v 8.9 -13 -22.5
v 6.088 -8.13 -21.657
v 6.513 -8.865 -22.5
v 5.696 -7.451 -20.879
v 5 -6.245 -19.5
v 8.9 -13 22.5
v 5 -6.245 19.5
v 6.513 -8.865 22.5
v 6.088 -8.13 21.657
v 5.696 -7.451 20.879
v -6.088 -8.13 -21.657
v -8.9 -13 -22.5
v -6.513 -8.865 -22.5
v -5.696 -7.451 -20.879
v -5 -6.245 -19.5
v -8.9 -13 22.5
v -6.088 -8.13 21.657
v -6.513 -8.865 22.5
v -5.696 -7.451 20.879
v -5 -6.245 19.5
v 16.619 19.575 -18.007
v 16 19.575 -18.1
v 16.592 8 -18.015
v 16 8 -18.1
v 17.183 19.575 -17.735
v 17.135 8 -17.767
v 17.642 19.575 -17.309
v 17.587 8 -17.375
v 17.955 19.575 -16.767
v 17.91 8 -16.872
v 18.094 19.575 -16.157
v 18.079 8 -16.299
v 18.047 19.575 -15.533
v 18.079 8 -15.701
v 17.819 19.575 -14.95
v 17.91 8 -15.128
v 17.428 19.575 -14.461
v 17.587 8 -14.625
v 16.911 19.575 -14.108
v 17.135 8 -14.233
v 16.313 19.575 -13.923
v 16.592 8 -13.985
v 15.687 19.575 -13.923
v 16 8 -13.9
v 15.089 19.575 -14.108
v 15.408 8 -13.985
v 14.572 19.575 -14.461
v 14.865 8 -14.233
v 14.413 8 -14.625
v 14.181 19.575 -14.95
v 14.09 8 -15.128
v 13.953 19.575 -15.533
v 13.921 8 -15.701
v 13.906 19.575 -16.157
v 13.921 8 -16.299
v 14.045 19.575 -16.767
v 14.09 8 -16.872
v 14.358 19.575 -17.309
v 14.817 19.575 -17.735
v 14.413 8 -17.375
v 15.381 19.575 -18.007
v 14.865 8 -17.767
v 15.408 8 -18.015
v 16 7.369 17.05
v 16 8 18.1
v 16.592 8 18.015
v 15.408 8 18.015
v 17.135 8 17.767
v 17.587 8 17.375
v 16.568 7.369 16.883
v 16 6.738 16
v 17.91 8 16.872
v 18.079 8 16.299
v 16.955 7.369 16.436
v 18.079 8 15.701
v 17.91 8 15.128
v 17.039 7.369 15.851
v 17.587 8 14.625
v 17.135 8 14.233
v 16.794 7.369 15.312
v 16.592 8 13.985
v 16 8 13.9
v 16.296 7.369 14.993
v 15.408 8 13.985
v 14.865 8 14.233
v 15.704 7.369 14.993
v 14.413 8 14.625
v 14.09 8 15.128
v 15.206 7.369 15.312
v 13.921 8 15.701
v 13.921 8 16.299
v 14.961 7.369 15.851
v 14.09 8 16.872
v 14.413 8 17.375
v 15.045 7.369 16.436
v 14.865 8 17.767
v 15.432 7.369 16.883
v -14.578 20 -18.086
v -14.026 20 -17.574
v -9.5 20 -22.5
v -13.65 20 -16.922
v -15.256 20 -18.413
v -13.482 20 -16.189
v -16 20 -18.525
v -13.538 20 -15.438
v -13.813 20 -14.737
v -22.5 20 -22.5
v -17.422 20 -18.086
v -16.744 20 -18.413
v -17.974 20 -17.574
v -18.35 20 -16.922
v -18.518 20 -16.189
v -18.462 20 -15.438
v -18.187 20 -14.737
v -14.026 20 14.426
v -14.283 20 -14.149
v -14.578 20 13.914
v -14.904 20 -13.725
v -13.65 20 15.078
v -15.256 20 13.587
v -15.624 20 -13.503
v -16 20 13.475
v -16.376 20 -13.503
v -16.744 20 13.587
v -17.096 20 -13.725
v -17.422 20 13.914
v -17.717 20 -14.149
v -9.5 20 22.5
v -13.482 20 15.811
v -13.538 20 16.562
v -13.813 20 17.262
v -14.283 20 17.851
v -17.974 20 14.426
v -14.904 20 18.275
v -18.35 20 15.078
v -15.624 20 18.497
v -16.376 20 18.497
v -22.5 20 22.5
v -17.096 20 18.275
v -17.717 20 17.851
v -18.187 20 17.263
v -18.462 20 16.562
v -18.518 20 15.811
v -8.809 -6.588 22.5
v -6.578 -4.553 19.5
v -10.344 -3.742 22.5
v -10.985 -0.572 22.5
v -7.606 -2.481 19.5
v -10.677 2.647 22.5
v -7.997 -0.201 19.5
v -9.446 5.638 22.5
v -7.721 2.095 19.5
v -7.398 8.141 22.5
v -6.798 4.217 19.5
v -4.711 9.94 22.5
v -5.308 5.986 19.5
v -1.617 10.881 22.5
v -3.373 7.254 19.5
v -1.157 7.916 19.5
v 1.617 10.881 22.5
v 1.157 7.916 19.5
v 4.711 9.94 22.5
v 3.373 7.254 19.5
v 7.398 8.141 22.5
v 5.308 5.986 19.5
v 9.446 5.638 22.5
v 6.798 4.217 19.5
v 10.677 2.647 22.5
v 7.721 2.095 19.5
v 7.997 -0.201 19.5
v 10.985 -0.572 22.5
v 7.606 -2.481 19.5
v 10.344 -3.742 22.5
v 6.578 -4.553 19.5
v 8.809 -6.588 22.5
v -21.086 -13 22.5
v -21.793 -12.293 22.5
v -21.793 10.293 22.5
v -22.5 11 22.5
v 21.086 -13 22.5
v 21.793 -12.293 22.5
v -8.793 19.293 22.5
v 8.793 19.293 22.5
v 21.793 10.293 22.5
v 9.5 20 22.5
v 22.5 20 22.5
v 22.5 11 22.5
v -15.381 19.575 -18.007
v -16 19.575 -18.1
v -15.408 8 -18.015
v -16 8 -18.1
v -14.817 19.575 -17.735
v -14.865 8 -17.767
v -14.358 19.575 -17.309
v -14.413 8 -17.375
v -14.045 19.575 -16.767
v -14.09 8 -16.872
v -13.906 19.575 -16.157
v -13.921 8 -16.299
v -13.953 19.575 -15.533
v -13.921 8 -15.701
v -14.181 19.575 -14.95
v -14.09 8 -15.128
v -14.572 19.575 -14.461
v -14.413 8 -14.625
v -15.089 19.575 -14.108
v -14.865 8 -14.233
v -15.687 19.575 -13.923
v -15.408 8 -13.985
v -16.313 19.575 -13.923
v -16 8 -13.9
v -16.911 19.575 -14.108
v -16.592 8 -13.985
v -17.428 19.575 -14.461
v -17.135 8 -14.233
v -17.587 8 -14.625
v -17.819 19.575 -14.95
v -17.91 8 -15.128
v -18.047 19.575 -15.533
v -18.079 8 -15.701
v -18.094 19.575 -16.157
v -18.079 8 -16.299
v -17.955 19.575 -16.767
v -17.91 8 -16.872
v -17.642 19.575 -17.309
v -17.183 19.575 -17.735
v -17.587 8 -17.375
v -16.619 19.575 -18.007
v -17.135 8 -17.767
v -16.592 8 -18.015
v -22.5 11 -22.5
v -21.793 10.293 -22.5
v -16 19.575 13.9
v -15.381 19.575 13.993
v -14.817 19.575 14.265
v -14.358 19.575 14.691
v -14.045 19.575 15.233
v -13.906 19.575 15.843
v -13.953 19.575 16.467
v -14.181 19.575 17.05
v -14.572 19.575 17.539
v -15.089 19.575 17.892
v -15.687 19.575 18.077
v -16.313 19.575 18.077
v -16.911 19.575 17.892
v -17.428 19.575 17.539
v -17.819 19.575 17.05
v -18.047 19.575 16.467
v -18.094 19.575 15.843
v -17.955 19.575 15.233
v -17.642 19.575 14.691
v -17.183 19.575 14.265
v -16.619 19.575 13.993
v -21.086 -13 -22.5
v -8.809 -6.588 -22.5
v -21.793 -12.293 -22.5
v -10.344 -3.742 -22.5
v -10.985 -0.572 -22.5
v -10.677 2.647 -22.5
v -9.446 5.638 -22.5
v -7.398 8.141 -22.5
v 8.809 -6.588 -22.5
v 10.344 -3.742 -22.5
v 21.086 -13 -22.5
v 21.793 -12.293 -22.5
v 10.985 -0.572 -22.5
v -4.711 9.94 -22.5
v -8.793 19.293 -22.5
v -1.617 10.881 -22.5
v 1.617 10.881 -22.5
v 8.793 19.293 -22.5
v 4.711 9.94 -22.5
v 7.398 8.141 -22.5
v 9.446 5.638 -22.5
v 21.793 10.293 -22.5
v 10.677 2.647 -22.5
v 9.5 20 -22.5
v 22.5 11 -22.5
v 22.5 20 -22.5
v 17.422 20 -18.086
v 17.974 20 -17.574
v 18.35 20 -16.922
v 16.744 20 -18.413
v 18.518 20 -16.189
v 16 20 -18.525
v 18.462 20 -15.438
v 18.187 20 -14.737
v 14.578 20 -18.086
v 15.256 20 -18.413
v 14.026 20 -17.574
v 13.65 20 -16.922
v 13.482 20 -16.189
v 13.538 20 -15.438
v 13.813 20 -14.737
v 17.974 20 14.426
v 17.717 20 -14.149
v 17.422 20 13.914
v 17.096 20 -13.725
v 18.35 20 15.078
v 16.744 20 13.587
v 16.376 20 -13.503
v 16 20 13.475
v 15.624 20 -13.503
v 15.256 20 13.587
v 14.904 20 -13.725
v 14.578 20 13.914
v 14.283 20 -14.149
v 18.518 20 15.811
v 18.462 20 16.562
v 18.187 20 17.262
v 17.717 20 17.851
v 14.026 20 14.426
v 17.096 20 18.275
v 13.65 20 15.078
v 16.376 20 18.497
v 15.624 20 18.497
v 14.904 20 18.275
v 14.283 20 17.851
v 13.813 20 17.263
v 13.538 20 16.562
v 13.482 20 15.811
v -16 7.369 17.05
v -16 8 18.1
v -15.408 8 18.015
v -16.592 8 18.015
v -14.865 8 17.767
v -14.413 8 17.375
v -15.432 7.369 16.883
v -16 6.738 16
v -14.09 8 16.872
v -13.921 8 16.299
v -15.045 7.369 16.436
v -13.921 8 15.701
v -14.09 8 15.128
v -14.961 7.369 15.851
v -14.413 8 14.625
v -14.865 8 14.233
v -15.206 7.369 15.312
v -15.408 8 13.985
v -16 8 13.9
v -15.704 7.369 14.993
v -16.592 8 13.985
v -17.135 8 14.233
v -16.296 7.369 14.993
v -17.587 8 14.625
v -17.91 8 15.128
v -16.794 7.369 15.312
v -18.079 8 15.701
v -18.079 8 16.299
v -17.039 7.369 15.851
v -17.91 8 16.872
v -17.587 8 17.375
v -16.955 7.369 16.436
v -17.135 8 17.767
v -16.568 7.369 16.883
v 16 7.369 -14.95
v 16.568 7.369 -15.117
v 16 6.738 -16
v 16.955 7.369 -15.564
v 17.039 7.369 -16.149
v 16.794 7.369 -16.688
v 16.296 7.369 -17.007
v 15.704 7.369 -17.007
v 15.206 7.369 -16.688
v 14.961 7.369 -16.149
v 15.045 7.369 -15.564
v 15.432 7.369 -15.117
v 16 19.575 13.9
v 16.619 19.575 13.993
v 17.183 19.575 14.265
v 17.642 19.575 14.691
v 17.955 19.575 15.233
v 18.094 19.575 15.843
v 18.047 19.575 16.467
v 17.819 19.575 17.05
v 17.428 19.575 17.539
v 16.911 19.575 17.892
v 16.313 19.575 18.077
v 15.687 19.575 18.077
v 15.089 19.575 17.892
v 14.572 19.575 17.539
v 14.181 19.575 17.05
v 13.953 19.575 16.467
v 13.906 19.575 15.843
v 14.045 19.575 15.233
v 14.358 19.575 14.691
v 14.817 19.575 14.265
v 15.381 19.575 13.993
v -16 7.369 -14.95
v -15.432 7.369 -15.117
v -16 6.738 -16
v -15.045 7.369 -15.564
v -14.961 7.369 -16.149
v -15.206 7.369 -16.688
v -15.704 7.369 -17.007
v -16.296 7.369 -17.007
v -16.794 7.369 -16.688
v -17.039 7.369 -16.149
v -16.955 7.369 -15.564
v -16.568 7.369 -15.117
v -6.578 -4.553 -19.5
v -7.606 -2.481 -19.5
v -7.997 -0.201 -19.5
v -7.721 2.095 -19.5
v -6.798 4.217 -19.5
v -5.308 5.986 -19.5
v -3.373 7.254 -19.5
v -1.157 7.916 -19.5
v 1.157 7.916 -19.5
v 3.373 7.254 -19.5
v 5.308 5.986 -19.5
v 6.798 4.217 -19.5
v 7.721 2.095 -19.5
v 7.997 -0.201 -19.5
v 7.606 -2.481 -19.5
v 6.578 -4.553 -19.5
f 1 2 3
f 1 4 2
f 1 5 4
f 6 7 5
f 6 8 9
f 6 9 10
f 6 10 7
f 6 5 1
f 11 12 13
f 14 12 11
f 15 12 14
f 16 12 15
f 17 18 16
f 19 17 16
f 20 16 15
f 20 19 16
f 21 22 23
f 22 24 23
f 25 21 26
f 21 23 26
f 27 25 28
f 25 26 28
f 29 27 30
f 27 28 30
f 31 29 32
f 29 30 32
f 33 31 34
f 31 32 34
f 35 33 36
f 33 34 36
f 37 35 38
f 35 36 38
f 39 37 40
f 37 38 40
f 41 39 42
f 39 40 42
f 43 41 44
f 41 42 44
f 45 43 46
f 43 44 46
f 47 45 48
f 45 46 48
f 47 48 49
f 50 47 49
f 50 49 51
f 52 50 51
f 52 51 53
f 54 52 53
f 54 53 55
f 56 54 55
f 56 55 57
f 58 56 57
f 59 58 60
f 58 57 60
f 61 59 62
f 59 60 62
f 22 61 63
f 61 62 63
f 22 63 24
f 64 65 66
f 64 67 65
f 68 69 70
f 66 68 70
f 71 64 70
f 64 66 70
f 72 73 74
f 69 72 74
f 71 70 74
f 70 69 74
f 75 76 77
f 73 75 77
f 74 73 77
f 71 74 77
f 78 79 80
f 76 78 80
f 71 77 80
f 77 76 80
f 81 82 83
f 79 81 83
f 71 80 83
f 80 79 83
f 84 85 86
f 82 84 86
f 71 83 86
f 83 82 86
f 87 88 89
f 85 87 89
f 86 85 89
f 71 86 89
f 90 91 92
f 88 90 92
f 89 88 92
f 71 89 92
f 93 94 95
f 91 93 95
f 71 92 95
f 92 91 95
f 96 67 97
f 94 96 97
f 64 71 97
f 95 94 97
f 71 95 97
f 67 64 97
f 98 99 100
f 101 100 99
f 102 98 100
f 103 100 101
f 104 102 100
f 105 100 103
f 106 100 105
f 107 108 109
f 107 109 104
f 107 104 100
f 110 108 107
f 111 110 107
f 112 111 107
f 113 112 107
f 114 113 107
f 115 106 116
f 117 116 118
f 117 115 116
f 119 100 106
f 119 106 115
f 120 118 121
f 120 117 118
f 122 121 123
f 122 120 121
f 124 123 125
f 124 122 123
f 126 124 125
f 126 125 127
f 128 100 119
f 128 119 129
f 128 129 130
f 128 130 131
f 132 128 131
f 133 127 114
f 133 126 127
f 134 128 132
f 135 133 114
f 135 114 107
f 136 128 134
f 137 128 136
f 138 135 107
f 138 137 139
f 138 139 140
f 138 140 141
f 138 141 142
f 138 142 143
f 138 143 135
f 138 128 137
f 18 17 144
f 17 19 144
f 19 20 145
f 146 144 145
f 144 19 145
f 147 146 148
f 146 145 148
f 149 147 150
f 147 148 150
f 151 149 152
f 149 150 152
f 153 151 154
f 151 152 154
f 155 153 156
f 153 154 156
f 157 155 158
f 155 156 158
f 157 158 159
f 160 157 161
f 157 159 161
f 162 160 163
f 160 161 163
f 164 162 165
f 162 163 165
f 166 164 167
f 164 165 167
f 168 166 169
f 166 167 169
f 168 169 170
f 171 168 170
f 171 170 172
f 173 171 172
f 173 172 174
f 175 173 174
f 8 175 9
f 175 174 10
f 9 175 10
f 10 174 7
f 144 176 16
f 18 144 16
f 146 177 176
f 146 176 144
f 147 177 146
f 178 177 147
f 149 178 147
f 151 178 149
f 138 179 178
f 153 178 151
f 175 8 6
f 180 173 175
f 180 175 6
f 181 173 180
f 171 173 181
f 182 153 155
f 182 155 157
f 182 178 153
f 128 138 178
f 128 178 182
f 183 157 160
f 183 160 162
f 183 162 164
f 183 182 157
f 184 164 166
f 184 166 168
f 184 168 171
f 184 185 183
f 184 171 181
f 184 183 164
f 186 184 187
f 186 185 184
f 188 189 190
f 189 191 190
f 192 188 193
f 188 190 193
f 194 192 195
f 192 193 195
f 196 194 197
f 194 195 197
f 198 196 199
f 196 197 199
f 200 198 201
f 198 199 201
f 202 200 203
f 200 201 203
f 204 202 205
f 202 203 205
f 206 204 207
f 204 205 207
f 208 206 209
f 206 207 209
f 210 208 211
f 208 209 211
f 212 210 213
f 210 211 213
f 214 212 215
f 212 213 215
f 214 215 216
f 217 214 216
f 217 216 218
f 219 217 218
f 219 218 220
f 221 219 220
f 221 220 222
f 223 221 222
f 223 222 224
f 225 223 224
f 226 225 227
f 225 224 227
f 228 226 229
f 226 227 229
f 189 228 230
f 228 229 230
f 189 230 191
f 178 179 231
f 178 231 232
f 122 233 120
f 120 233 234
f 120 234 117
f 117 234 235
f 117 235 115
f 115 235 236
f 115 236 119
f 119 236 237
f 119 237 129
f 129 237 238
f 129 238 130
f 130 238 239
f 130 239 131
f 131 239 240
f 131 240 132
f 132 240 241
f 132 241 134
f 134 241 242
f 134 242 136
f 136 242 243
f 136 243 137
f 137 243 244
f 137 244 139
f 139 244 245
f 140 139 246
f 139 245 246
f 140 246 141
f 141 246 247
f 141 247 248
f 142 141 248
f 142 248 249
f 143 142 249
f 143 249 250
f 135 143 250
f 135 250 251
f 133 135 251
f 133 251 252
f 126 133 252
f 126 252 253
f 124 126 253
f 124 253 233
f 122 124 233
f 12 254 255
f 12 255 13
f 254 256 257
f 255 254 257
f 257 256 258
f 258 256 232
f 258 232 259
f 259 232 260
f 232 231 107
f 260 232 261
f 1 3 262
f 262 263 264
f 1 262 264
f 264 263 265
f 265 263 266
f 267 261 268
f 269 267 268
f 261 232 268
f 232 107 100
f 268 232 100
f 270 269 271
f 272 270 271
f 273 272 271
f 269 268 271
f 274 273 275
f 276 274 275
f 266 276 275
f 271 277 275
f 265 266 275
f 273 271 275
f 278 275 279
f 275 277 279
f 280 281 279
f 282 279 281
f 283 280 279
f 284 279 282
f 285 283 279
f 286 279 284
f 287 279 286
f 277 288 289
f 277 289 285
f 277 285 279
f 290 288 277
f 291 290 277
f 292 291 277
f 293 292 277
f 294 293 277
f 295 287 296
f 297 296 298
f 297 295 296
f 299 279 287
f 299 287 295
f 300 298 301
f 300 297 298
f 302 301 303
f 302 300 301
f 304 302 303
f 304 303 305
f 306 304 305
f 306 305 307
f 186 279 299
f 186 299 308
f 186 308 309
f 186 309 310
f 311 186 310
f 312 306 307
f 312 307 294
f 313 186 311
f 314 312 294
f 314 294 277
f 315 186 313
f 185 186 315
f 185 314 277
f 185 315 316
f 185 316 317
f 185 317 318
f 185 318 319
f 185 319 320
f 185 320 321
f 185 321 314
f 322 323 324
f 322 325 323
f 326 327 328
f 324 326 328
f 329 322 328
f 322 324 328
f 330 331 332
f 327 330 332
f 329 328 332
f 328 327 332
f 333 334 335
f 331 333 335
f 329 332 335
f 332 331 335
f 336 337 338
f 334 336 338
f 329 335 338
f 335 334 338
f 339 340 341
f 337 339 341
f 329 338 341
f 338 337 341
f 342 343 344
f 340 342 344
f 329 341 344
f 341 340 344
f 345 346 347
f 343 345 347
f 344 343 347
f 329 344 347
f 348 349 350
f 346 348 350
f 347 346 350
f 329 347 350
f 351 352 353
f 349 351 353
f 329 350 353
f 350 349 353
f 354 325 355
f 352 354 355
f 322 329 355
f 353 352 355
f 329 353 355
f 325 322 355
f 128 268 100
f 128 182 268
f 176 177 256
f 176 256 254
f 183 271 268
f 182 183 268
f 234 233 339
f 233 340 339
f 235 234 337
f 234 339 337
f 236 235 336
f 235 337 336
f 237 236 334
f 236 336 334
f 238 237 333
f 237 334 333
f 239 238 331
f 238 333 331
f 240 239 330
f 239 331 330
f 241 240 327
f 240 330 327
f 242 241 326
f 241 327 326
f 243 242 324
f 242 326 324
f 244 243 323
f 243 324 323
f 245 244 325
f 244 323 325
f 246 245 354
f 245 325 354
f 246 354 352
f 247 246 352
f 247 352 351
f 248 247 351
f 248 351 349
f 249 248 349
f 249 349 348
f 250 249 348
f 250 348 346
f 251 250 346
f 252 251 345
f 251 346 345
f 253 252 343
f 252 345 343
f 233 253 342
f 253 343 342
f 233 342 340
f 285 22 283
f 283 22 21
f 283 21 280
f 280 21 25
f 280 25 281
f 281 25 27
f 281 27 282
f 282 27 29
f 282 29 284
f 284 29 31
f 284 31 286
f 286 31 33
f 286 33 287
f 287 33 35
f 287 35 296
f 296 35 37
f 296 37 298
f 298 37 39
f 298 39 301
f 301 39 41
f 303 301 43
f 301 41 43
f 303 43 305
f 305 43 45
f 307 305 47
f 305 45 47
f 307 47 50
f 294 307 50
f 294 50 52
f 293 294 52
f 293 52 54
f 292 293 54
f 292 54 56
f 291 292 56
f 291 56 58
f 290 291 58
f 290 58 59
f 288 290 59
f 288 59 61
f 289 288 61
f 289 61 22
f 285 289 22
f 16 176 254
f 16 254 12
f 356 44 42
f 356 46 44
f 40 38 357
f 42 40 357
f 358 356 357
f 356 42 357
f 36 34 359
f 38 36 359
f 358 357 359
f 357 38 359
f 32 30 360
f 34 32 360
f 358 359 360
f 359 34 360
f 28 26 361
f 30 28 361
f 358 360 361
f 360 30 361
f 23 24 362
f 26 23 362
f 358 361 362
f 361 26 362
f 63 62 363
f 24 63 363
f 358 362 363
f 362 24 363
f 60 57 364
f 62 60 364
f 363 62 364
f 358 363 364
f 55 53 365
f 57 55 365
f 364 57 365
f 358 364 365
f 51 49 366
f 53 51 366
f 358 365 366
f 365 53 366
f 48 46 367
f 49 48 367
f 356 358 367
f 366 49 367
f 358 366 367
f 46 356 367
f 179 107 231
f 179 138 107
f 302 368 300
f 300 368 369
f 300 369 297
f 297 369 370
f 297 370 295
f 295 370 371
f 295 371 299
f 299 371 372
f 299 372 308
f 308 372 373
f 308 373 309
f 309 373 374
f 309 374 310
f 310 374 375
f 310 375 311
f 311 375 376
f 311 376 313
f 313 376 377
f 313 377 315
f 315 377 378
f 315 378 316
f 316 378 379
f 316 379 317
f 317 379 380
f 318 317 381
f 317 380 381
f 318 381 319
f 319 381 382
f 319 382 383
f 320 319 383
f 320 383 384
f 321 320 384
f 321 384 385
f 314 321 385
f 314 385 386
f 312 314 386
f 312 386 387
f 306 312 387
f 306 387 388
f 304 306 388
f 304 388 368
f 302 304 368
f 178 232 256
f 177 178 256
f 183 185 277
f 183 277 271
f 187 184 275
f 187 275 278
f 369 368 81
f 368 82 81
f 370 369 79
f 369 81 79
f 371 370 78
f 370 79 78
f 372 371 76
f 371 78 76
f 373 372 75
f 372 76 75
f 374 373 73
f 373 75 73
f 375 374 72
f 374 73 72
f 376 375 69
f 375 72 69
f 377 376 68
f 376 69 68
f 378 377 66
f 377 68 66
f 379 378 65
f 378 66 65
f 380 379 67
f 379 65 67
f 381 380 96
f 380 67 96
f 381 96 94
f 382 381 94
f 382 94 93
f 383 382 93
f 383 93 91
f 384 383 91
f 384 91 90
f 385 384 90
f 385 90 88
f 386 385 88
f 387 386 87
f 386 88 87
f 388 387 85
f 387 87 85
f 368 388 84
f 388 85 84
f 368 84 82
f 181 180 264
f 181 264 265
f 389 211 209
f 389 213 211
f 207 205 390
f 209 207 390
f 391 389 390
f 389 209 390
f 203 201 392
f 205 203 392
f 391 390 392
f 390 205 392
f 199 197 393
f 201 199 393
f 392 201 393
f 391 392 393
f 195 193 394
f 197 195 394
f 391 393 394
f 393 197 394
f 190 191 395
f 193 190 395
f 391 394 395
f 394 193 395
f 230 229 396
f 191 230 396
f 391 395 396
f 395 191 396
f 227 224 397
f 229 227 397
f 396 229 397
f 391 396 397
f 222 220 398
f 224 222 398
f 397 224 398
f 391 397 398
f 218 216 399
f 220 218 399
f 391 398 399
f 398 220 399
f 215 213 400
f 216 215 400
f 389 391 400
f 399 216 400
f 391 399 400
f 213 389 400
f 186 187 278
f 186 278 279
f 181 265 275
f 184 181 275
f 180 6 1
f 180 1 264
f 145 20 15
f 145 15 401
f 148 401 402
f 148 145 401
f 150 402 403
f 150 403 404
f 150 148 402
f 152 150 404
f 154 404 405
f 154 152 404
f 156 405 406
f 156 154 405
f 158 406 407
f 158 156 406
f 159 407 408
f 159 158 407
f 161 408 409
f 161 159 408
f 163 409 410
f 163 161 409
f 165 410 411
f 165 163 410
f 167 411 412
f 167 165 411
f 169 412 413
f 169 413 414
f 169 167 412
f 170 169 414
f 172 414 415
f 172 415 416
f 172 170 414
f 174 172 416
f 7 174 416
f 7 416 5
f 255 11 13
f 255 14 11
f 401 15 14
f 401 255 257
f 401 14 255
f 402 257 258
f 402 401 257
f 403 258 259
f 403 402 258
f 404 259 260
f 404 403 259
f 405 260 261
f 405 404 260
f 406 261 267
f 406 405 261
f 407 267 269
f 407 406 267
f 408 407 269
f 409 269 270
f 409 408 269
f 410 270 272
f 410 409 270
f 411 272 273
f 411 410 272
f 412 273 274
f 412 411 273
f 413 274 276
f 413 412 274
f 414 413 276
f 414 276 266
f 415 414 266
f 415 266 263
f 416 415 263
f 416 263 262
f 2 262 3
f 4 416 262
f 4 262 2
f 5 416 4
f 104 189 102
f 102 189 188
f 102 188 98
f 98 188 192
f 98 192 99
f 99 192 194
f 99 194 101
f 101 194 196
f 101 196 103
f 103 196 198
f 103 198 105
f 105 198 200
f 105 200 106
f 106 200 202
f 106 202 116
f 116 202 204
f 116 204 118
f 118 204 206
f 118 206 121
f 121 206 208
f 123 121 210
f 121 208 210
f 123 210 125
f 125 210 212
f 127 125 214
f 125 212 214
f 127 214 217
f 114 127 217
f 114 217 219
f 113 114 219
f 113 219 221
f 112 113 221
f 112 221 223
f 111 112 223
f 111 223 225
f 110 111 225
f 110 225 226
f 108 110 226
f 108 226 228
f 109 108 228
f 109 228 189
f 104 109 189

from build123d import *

# Parameters (mm, degrees)
BOSS_EXTRUDE1_DEPTH             = 22.5
M5X0_8_TAPPED_HOLE1_D           = 4.2
M5X0_8_TAPPED_HOLE1_DEPTH       = 12.0000014
M5X0_8_TAPPED_HOLE1_CSINK_D     = 5.05
M5X0_8_TAPPED_HOLE1_CSINK_ANGLE = 90
M5X0_8_TAPPED_HOLE1_TIP         = 1.2618073
CHAMFER1_SIZE                   = 3


with BuildPart() as part:
    # Sketch1 → Boss-Extrude1 (new body, symmetric)
    with BuildSketch(Plane.XY):
        with BuildLine():
            Line((-22.5, 20), (-22.5, 11))
            Line((-22.5, 11), (-21.792893219, 10.292893219))
            Line((-21.792893219, 10.292893219), (-21.792893219, -12.292893219))
            Line((-21.792893219, -12.292893219), (-21.085786438, -13))
            Line((-21.085786438, -13), (-8.900002224, -13))
            Line((-8.900002224, -13), (-5, -6.244997998))
            ThreePointArc((-5, -6.244997998), (0, 8), (5, -6.244997998))
            Line((5, -6.244997998), (8.900002224, -13))
            Line((8.900002224, -13), (21.085786438, -13))
            Line((21.085786438, -13), (21.792893219, -12.292893219))
            Line((21.792893219, -12.292893219), (21.792893219, 10.292893219))
            Line((21.792893219, 10.292893219), (22.5, 11))
            Line((22.5, 11), (22.5, 20))
            Line((22.5, 20), (9.5, 20))
            Line((9.5, 20), (8.792893219, 19.292893219))
            Line((8.792893219, 19.292893219), (-8.792893219, 19.292893219))
            Line((-8.792893219, 19.292893219), (-9.5, 20))
            Line((-9.5, 20), (-22.5, 20))
        make_face()
    extrude(amount=BOSS_EXTRUDE1_DEPTH, both=True)

    # M5x0.8 Tapped Hole1
    with Locations(Plane(origin=(16, 20, 16), x_dir=(0, 0, 1), z_dir=(0, 1, 0))):
        with Locations((0, 0), (-32, 0), (-32, -32), (0, -32)):
            CounterSinkHole(M5X0_8_TAPPED_HOLE1_D / 2, M5X0_8_TAPPED_HOLE1_CSINK_D / 2, depth=M5X0_8_TAPPED_HOLE1_DEPTH, counter_sink_angle=M5X0_8_TAPPED_HOLE1_CSINK_ANGLE)
            with Locations((0, 0, -(M5X0_8_TAPPED_HOLE1_DEPTH + M5X0_8_TAPPED_HOLE1_TIP / 2))):  # 118° drill point
                Cone(0, M5X0_8_TAPPED_HOLE1_D / 2, M5X0_8_TAPPED_HOLE1_TIP, mode=Mode.SUBTRACT)

    # Chamfer1
    chamfer1_edges = [part.edges().sort_by_distance(p)[0] for p in [
        (0, 8, -22.5),
        (0, 8, 22.5),
    ]]
    chamfer(chamfer1_edges, length=CHAMFER1_SIZE)


solid = part.part
